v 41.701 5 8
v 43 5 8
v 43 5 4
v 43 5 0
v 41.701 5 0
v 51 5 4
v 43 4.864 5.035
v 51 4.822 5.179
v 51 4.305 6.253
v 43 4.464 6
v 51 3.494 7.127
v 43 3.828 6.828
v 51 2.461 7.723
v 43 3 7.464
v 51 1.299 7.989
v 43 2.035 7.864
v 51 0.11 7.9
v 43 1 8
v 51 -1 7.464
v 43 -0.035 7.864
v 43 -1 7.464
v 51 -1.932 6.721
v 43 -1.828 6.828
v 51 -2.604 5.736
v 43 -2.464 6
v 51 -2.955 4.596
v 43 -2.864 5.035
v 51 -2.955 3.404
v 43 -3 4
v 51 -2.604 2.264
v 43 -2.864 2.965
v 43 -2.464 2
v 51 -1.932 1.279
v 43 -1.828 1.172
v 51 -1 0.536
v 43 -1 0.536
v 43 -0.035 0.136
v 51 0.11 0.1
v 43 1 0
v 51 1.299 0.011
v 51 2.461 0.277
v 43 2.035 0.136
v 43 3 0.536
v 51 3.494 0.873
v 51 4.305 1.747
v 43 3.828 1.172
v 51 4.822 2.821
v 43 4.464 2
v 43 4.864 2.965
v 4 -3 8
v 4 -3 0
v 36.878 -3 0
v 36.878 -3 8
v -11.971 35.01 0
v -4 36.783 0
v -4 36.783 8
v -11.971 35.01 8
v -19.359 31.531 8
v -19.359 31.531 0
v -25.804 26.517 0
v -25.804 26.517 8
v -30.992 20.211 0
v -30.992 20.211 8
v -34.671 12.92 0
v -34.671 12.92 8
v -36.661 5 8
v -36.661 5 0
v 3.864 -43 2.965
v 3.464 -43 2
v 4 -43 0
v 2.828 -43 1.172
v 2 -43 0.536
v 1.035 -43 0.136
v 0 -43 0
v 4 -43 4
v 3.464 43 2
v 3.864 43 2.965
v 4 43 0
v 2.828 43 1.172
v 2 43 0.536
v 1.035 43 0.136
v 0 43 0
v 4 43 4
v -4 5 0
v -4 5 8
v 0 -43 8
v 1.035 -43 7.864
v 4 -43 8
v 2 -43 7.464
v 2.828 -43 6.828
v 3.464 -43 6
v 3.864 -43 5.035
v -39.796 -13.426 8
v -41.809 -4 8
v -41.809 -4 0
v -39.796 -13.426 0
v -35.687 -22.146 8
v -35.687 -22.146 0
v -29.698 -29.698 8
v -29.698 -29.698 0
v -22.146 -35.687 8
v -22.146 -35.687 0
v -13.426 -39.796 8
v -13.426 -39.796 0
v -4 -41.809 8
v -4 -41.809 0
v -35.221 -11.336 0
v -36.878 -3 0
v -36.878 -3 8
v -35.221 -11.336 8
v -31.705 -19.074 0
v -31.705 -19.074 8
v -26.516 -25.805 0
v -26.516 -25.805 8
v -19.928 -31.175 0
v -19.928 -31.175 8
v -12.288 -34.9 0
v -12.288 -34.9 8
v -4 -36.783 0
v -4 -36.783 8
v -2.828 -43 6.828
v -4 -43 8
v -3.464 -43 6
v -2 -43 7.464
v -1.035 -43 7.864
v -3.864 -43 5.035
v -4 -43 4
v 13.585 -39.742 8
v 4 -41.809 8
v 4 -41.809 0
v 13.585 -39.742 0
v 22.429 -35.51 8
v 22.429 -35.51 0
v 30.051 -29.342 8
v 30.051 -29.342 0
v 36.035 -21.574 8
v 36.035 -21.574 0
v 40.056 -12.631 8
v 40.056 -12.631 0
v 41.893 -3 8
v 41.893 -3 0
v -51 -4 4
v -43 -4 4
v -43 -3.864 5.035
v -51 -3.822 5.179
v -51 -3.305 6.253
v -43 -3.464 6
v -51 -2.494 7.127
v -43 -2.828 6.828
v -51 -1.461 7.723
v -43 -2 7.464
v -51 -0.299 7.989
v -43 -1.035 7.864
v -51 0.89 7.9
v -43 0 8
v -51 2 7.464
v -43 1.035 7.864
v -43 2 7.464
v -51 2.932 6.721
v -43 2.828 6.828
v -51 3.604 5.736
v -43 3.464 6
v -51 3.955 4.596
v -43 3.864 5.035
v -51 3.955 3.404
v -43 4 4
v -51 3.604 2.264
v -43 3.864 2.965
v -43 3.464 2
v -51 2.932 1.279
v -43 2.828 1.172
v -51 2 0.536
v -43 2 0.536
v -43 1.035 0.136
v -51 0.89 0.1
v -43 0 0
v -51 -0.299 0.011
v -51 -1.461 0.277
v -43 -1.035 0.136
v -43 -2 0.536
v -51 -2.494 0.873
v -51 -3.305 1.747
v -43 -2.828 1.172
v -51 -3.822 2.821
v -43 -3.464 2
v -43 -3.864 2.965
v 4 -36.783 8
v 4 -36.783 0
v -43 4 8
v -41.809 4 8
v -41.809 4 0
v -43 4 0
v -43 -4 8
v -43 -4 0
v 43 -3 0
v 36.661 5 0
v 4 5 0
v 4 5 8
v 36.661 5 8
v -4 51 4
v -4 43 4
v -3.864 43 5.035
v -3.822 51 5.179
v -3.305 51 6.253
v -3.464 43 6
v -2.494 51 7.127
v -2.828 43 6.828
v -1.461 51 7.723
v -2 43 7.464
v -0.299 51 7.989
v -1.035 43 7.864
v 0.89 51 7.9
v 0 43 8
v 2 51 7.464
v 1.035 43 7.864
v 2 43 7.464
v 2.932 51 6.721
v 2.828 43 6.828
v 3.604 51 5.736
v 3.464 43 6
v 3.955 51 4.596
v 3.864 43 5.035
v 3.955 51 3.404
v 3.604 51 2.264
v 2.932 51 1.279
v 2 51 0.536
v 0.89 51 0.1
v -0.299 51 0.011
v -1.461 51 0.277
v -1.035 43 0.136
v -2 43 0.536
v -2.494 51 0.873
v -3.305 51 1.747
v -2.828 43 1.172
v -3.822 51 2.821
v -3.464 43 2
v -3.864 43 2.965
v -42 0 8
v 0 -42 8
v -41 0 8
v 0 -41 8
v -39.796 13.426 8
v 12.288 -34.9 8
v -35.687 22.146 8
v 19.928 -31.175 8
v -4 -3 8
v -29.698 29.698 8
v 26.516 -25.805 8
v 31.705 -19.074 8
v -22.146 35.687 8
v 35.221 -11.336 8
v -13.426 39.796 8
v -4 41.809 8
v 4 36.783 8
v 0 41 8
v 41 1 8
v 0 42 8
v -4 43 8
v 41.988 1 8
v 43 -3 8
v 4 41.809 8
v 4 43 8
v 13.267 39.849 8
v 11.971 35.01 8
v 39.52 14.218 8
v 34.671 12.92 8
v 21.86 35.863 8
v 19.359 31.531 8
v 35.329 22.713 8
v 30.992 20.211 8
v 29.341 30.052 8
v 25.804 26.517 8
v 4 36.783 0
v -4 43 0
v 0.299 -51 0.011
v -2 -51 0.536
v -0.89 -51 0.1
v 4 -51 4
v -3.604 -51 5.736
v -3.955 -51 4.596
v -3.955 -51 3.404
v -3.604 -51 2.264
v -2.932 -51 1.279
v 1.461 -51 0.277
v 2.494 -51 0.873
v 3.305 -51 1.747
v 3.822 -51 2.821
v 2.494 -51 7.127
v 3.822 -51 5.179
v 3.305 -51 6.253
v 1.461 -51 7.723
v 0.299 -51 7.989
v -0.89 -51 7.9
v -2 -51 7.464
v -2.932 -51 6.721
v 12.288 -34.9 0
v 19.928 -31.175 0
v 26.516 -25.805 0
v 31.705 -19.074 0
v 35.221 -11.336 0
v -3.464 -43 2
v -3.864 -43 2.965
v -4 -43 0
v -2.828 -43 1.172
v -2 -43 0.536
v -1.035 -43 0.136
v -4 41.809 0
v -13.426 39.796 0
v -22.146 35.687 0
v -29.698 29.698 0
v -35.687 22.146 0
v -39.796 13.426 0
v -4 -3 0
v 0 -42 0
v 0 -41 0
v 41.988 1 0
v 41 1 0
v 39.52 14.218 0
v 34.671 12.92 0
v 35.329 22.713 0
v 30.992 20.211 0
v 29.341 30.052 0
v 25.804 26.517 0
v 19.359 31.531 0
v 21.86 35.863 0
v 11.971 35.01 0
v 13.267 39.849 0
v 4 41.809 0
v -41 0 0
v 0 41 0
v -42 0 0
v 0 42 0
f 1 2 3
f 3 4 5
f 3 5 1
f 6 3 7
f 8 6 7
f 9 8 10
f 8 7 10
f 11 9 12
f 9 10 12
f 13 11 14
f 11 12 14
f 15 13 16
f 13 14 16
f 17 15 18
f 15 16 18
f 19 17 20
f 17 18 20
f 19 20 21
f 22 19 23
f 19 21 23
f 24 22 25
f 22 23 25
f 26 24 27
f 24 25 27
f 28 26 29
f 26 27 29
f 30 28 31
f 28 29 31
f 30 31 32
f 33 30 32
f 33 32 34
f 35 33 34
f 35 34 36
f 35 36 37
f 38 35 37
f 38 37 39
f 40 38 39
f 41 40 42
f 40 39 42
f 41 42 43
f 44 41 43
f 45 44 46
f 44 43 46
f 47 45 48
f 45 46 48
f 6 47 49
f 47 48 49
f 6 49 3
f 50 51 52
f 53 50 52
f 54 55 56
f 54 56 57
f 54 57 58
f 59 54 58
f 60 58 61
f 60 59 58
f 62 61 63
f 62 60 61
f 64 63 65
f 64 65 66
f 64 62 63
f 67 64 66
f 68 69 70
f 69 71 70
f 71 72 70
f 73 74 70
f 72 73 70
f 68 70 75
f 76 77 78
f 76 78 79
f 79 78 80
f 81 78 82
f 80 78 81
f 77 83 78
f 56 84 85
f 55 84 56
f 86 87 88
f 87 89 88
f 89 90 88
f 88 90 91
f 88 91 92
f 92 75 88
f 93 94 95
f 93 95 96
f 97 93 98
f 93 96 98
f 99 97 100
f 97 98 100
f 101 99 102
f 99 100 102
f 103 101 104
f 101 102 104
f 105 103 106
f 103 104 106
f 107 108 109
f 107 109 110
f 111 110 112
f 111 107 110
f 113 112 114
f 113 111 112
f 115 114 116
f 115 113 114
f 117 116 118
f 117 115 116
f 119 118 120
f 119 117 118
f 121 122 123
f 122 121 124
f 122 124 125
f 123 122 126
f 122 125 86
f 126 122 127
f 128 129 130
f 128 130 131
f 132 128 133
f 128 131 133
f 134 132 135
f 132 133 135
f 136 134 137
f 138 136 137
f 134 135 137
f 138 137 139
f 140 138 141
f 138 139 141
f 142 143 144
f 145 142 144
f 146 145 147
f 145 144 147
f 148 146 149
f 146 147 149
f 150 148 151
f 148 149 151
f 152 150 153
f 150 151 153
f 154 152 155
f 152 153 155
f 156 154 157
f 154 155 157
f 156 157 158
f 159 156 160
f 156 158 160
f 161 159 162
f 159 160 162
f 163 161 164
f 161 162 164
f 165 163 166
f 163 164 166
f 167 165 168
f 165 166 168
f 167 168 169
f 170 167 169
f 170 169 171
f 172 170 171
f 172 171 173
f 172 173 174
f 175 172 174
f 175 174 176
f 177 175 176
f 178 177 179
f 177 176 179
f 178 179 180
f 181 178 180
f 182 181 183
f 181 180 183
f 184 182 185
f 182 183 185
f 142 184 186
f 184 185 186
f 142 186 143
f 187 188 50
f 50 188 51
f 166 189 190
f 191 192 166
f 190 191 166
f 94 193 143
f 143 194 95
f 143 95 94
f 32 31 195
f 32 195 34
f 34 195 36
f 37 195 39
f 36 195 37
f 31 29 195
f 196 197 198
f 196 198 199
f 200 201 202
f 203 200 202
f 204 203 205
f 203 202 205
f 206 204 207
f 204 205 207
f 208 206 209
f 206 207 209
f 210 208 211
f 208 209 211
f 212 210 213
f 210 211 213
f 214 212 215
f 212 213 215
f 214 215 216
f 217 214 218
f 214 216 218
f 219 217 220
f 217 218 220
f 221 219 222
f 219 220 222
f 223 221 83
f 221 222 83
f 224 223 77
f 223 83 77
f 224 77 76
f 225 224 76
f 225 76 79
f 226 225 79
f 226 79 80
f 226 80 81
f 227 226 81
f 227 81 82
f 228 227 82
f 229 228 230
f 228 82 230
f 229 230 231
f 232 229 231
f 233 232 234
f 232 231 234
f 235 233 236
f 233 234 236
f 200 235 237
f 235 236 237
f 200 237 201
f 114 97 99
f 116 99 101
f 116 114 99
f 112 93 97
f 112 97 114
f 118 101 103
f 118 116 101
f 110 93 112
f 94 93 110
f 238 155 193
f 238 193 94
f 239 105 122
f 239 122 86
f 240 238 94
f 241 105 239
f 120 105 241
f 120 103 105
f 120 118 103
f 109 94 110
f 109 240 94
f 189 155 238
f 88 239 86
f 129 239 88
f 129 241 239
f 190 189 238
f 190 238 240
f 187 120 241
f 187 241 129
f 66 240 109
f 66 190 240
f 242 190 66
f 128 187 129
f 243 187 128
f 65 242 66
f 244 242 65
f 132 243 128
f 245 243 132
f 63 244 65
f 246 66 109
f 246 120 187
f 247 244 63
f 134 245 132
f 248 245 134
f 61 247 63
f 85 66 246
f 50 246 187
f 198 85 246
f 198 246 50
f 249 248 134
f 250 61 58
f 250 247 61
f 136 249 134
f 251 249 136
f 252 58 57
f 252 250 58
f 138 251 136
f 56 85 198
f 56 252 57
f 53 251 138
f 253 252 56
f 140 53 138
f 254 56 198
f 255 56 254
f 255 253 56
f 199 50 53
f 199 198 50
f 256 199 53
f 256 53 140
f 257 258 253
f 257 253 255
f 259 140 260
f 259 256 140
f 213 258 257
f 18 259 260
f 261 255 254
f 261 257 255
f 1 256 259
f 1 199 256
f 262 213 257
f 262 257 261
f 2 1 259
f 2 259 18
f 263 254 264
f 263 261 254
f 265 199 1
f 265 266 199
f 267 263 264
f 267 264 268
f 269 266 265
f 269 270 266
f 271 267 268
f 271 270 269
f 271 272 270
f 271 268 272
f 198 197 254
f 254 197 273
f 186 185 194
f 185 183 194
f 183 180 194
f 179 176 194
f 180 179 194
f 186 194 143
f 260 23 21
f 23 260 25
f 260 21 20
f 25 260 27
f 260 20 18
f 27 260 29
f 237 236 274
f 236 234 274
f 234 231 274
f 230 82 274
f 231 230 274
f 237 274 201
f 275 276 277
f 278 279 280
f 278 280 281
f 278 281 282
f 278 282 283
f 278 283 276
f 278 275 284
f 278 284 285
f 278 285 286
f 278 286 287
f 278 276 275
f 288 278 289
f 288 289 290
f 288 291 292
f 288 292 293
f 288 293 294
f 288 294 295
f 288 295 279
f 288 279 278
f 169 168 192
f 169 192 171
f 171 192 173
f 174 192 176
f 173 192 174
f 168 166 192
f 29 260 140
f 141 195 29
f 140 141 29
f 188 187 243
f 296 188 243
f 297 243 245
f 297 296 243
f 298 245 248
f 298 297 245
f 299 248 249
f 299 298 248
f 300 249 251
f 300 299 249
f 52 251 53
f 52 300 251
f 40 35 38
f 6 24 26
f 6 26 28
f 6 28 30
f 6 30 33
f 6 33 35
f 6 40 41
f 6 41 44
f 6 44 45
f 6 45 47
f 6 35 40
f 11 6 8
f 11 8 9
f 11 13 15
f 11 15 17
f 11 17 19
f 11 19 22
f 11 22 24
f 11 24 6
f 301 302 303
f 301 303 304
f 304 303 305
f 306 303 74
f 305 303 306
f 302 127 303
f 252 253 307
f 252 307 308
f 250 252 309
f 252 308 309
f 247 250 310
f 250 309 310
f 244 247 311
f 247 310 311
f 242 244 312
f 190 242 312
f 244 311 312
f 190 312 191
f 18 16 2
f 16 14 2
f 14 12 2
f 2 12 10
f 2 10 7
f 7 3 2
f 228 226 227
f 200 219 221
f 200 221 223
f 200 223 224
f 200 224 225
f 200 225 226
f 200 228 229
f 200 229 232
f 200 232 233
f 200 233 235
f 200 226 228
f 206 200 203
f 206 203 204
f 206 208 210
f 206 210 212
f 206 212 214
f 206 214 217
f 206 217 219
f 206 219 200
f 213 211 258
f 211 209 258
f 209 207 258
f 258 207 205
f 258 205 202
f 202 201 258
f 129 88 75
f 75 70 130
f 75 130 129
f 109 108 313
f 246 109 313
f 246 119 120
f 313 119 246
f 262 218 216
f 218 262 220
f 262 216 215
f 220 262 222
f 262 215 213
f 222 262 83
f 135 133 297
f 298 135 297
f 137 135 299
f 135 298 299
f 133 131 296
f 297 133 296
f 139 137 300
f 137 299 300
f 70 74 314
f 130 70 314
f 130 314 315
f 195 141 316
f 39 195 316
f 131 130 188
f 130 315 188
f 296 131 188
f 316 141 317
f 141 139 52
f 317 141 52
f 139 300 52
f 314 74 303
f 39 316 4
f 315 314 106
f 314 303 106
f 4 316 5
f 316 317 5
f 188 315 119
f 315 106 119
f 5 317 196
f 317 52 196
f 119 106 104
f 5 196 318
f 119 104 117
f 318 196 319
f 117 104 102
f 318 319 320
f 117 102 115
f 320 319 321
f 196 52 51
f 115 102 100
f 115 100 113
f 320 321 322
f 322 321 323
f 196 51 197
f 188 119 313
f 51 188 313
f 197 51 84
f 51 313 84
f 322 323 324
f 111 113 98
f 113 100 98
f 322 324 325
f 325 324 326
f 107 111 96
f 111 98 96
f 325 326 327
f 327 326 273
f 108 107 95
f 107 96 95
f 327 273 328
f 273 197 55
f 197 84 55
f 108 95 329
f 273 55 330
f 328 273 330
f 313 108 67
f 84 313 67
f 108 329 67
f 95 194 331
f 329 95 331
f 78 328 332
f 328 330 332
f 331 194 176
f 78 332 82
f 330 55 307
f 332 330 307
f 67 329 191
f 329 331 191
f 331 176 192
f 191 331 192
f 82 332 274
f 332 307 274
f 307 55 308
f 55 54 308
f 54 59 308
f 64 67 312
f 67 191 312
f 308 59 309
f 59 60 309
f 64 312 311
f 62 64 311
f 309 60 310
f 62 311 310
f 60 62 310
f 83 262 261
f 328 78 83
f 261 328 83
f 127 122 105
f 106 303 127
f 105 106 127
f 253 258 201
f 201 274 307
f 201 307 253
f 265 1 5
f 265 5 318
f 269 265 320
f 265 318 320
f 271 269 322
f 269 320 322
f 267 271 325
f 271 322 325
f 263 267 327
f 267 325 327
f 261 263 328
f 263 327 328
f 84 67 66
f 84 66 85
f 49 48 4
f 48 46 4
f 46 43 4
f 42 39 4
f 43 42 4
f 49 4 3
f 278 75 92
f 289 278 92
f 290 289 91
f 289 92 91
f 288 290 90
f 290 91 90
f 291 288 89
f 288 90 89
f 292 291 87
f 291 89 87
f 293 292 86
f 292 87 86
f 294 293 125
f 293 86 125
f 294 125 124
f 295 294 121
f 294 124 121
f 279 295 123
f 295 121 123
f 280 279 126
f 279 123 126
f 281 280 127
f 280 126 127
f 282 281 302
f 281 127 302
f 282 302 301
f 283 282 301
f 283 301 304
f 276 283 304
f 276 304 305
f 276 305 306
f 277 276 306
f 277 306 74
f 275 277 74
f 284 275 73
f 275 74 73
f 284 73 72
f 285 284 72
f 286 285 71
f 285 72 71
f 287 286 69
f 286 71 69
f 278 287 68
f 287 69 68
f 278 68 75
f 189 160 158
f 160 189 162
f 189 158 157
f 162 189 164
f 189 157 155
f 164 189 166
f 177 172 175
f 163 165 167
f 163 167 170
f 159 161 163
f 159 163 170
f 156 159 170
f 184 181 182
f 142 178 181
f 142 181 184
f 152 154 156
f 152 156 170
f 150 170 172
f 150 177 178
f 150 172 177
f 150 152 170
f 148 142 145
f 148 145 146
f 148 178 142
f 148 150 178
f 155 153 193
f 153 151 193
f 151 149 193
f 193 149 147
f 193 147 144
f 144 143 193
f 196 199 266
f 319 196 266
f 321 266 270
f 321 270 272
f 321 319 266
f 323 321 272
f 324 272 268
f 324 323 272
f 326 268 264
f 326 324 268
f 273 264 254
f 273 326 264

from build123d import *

# Parameters (mm, degrees)
CYLINDER004_R             = 4
CYLINDER004_DEPTH         = 10
CYLINDER004_ROLL_ANGLE    = 90
BOX003_W                  = 8
BOX003_H                  = 3
BOX003_DEPTH              = 8
FUSION003_PLACEMENT_ANGLE = 90
CYLINDER005_R             = 4
CYLINDER005_DEPTH         = 10
CYLINDER005_ROLL_ANGLE    = 90
BOX004_W                  = 8
BOX004_H                  = 3
BOX004_DEPTH              = 8
CYLINDER006_R             = 4
CYLINDER006_DEPTH         = 10
CYLINDER006_ROLL_ANGLE    = 90
BOX005_W                  = 8
BOX005_H                  = 3
BOX005_DEPTH              = 8
FUSION005_PLACEMENT_ANGLE = -90
BOX_W                     = 80
BOX_H                     = 8
BOX_DEPTH                 = 8
BOX_PLACEMENT_ANGLE       = 90
CYLINDER_R                = 42
CYLINDER_DEPTH            = 8
THICKNESS_T               = -5
BOX001_W                  = 80
BOX001_H                  = 8
BOX001_DEPTH              = 8
CYLINDER003_R             = 4
CYLINDER003_DEPTH         = 10
CYLINDER003_ROLL_ANGLE    = 90
BOX002_W                  = 8
BOX002_H                  = 3
BOX002_DEPTH              = 8
FUSION002_PLACEMENT_ANGLE = 180


with BuildPart() as cylinder004:
    # Cylinder004 → Cylinder004 (new body)
    with BuildSketch(Plane.XY):
        Circle(CYLINDER004_R)
    extrude(amount=CYLINDER004_DEPTH)


with BuildPart() as cylinder004_1:
    # Cylinder004 roll: moved
    add(cylinder004.part.rotate(Axis((0, 0, 0), (1, 0, 0)), CYLINDER004_ROLL_ANGLE))


with BuildPart() as cylinder004_2:
    # Cylinder004 placement: moved
    add(cylinder004_1.part.moved(Location((0, -41, 4))))


with BuildPart() as sujetabearing2:
    # Box003 → Box003 (new body)
    with BuildSketch(Plane(origin=(-4, -43, 0), x_dir=(1, 0, 0), z_dir=(0, 0, 1))):
        with Locations((4, 1.5)):
            Rectangle(BOX003_W, BOX003_H)
    extrude(amount=BOX003_DEPTH)

    # Fusion003: union Cylinder004
    add(cylinder004_2.part)


with BuildPart() as sujetabearing2_1:
    # Fusion003 placement: moved
    add(sujetabearing2.part.moved(Location((0, 1, 0))).rotate(Axis((0, 1, 0), (0, 0, 1)), FUSION003_PLACEMENT_ANGLE))


with BuildPart() as cylinder005:
    # Cylinder005 → Cylinder005 (new body)
    with BuildSketch(Plane.XY):
        Circle(CYLINDER005_R)
    extrude(amount=CYLINDER005_DEPTH)


with BuildPart() as cylinder005_1:
    # Cylinder005 roll: moved
    add(cylinder005.part.rotate(Axis((0, 0, 0), (1, 0, 0)), CYLINDER005_ROLL_ANGLE))


with BuildPart() as cylinder005_2:
    # Cylinder005 placement: moved
    add(cylinder005_1.part.moved(Location((0, -41, 4))))


with BuildPart() as sujetabearing3:
    # Box004 → Box004 (new body)
    with BuildSketch(Plane(origin=(-4, -43, 0), x_dir=(1, 0, 0), z_dir=(0, 0, 1))):
        with Locations((4, 1.5)):
            Rectangle(BOX004_W, BOX004_H)
    extrude(amount=BOX004_DEPTH)

    # Fusion004: union Cylinder005
    add(cylinder005_2.part)


with BuildPart() as cylinder006:
    # Cylinder006 → Cylinder006 (new body)
    with BuildSketch(Plane.XY):
        Circle(CYLINDER006_R)
    extrude(amount=CYLINDER006_DEPTH)


with BuildPart() as cylinder006_1:
    # Cylinder006 roll: moved
    add(cylinder006.part.rotate(Axis((0, 0, 0), (1, 0, 0)), CYLINDER006_ROLL_ANGLE))


with BuildPart() as cylinder006_2:
    # Cylinder006 placement: moved
    add(cylinder006_1.part.moved(Location((0, -41, 4))))


with BuildPart() as sujetabearing4:
    # Box005 → Box005 (new body)
    with BuildSketch(Plane(origin=(-4, -43, 0), x_dir=(1, 0, 0), z_dir=(0, 0, 1))):
        with Locations((4, 1.5)):
            Rectangle(BOX005_W, BOX005_H)
    extrude(amount=BOX005_DEPTH)

    # Fusion005: union Cylinder006
    add(cylinder006_2.part)


with BuildPart() as sujetabearing4_1:
    # Fusion005 placement: moved
    add(sujetabearing4.part.rotate(Axis((0, 0, 0), (0, 0, 1)), FUSION005_PLACEMENT_ANGLE))


with BuildPart() as cube:
    # Box → Box (new body)
    with BuildSketch(Plane.XY):
        with Locations((40, 4)):
            Rectangle(BOX_W, BOX_H)
    extrude(amount=BOX_DEPTH)


with BuildPart() as cube_1:
    # Box placement: moved
    add(cube.part.moved(Location((4, -40, 0))).rotate(Axis((4, -40, 0), (0, 0, 1)), BOX_PLACEMENT_ANGLE))


with BuildPart() as thickness:
    # Cylinder → Cylinder (new body)
    with BuildSketch(Plane.XY):
        Circle(CYLINDER_R)
    extrude(amount=CYLINDER_DEPTH)

    # Thickness
    thickness_openings = [thickness.faces().sort_by_distance(p)[0] for p in [
        (0, 0, 0),
        (0, 0, 8),
    ]]
    offset(amount=THICKNESS_T, openings=thickness_openings)


with BuildPart() as circuloycruz:
    # Box001 → Box001 (new body)
    with BuildSketch(Plane(origin=(-40, -3, 0), x_dir=(1, 0, 0), z_dir=(0, 0, 1))):
        with Locations((40, 4)):
            Rectangle(BOX001_W, BOX001_H)
    extrude(amount=BOX001_DEPTH)

    # Fusion: union Cube, Thickness
    add(cube_1.part)
    add(thickness.part)


with BuildPart() as cylinder003:
    # Cylinder003 → Cylinder003 (new body)
    with BuildSketch(Plane.XY):
        Circle(CYLINDER003_R)
    extrude(amount=CYLINDER003_DEPTH)


with BuildPart() as cylinder003_1:
    # Cylinder003 roll: moved
    add(cylinder003.part.rotate(Axis((0, 0, 0), (1, 0, 0)), CYLINDER003_ROLL_ANGLE))


with BuildPart() as cylinder003_2:
    # Cylinder003 placement: moved
    add(cylinder003_1.part.moved(Location((0, -41, 4))))


with BuildPart() as fusion006:
    # Box002 → Box002 (new body)
    with BuildSketch(Plane(origin=(-4, -43, 0), x_dir=(1, 0, 0), z_dir=(0, 0, 1))):
        with Locations((4, 1.5)):
            Rectangle(BOX002_W, BOX002_H)
    extrude(amount=BOX002_DEPTH)

    # Fusion002: union Cylinder003
    add(cylinder003_2.part)


with BuildPart() as fusion006_1:
    # Fusion002 placement: moved
    add(fusion006.part.rotate(Axis((0, 0, 0), (0, 0, 1)), FUSION002_PLACEMENT_ANGLE))

    # Fusion006: union sujetaBearing2, sujetaBearing3, sujetaBearing4, circuloYcruz
    add(sujetabearing2_1.part)
    add(sujetabearing3.part)
    add(sujetabearing4_1.part)
    add(circuloycruz.part)


solid = fusion006_1.part
